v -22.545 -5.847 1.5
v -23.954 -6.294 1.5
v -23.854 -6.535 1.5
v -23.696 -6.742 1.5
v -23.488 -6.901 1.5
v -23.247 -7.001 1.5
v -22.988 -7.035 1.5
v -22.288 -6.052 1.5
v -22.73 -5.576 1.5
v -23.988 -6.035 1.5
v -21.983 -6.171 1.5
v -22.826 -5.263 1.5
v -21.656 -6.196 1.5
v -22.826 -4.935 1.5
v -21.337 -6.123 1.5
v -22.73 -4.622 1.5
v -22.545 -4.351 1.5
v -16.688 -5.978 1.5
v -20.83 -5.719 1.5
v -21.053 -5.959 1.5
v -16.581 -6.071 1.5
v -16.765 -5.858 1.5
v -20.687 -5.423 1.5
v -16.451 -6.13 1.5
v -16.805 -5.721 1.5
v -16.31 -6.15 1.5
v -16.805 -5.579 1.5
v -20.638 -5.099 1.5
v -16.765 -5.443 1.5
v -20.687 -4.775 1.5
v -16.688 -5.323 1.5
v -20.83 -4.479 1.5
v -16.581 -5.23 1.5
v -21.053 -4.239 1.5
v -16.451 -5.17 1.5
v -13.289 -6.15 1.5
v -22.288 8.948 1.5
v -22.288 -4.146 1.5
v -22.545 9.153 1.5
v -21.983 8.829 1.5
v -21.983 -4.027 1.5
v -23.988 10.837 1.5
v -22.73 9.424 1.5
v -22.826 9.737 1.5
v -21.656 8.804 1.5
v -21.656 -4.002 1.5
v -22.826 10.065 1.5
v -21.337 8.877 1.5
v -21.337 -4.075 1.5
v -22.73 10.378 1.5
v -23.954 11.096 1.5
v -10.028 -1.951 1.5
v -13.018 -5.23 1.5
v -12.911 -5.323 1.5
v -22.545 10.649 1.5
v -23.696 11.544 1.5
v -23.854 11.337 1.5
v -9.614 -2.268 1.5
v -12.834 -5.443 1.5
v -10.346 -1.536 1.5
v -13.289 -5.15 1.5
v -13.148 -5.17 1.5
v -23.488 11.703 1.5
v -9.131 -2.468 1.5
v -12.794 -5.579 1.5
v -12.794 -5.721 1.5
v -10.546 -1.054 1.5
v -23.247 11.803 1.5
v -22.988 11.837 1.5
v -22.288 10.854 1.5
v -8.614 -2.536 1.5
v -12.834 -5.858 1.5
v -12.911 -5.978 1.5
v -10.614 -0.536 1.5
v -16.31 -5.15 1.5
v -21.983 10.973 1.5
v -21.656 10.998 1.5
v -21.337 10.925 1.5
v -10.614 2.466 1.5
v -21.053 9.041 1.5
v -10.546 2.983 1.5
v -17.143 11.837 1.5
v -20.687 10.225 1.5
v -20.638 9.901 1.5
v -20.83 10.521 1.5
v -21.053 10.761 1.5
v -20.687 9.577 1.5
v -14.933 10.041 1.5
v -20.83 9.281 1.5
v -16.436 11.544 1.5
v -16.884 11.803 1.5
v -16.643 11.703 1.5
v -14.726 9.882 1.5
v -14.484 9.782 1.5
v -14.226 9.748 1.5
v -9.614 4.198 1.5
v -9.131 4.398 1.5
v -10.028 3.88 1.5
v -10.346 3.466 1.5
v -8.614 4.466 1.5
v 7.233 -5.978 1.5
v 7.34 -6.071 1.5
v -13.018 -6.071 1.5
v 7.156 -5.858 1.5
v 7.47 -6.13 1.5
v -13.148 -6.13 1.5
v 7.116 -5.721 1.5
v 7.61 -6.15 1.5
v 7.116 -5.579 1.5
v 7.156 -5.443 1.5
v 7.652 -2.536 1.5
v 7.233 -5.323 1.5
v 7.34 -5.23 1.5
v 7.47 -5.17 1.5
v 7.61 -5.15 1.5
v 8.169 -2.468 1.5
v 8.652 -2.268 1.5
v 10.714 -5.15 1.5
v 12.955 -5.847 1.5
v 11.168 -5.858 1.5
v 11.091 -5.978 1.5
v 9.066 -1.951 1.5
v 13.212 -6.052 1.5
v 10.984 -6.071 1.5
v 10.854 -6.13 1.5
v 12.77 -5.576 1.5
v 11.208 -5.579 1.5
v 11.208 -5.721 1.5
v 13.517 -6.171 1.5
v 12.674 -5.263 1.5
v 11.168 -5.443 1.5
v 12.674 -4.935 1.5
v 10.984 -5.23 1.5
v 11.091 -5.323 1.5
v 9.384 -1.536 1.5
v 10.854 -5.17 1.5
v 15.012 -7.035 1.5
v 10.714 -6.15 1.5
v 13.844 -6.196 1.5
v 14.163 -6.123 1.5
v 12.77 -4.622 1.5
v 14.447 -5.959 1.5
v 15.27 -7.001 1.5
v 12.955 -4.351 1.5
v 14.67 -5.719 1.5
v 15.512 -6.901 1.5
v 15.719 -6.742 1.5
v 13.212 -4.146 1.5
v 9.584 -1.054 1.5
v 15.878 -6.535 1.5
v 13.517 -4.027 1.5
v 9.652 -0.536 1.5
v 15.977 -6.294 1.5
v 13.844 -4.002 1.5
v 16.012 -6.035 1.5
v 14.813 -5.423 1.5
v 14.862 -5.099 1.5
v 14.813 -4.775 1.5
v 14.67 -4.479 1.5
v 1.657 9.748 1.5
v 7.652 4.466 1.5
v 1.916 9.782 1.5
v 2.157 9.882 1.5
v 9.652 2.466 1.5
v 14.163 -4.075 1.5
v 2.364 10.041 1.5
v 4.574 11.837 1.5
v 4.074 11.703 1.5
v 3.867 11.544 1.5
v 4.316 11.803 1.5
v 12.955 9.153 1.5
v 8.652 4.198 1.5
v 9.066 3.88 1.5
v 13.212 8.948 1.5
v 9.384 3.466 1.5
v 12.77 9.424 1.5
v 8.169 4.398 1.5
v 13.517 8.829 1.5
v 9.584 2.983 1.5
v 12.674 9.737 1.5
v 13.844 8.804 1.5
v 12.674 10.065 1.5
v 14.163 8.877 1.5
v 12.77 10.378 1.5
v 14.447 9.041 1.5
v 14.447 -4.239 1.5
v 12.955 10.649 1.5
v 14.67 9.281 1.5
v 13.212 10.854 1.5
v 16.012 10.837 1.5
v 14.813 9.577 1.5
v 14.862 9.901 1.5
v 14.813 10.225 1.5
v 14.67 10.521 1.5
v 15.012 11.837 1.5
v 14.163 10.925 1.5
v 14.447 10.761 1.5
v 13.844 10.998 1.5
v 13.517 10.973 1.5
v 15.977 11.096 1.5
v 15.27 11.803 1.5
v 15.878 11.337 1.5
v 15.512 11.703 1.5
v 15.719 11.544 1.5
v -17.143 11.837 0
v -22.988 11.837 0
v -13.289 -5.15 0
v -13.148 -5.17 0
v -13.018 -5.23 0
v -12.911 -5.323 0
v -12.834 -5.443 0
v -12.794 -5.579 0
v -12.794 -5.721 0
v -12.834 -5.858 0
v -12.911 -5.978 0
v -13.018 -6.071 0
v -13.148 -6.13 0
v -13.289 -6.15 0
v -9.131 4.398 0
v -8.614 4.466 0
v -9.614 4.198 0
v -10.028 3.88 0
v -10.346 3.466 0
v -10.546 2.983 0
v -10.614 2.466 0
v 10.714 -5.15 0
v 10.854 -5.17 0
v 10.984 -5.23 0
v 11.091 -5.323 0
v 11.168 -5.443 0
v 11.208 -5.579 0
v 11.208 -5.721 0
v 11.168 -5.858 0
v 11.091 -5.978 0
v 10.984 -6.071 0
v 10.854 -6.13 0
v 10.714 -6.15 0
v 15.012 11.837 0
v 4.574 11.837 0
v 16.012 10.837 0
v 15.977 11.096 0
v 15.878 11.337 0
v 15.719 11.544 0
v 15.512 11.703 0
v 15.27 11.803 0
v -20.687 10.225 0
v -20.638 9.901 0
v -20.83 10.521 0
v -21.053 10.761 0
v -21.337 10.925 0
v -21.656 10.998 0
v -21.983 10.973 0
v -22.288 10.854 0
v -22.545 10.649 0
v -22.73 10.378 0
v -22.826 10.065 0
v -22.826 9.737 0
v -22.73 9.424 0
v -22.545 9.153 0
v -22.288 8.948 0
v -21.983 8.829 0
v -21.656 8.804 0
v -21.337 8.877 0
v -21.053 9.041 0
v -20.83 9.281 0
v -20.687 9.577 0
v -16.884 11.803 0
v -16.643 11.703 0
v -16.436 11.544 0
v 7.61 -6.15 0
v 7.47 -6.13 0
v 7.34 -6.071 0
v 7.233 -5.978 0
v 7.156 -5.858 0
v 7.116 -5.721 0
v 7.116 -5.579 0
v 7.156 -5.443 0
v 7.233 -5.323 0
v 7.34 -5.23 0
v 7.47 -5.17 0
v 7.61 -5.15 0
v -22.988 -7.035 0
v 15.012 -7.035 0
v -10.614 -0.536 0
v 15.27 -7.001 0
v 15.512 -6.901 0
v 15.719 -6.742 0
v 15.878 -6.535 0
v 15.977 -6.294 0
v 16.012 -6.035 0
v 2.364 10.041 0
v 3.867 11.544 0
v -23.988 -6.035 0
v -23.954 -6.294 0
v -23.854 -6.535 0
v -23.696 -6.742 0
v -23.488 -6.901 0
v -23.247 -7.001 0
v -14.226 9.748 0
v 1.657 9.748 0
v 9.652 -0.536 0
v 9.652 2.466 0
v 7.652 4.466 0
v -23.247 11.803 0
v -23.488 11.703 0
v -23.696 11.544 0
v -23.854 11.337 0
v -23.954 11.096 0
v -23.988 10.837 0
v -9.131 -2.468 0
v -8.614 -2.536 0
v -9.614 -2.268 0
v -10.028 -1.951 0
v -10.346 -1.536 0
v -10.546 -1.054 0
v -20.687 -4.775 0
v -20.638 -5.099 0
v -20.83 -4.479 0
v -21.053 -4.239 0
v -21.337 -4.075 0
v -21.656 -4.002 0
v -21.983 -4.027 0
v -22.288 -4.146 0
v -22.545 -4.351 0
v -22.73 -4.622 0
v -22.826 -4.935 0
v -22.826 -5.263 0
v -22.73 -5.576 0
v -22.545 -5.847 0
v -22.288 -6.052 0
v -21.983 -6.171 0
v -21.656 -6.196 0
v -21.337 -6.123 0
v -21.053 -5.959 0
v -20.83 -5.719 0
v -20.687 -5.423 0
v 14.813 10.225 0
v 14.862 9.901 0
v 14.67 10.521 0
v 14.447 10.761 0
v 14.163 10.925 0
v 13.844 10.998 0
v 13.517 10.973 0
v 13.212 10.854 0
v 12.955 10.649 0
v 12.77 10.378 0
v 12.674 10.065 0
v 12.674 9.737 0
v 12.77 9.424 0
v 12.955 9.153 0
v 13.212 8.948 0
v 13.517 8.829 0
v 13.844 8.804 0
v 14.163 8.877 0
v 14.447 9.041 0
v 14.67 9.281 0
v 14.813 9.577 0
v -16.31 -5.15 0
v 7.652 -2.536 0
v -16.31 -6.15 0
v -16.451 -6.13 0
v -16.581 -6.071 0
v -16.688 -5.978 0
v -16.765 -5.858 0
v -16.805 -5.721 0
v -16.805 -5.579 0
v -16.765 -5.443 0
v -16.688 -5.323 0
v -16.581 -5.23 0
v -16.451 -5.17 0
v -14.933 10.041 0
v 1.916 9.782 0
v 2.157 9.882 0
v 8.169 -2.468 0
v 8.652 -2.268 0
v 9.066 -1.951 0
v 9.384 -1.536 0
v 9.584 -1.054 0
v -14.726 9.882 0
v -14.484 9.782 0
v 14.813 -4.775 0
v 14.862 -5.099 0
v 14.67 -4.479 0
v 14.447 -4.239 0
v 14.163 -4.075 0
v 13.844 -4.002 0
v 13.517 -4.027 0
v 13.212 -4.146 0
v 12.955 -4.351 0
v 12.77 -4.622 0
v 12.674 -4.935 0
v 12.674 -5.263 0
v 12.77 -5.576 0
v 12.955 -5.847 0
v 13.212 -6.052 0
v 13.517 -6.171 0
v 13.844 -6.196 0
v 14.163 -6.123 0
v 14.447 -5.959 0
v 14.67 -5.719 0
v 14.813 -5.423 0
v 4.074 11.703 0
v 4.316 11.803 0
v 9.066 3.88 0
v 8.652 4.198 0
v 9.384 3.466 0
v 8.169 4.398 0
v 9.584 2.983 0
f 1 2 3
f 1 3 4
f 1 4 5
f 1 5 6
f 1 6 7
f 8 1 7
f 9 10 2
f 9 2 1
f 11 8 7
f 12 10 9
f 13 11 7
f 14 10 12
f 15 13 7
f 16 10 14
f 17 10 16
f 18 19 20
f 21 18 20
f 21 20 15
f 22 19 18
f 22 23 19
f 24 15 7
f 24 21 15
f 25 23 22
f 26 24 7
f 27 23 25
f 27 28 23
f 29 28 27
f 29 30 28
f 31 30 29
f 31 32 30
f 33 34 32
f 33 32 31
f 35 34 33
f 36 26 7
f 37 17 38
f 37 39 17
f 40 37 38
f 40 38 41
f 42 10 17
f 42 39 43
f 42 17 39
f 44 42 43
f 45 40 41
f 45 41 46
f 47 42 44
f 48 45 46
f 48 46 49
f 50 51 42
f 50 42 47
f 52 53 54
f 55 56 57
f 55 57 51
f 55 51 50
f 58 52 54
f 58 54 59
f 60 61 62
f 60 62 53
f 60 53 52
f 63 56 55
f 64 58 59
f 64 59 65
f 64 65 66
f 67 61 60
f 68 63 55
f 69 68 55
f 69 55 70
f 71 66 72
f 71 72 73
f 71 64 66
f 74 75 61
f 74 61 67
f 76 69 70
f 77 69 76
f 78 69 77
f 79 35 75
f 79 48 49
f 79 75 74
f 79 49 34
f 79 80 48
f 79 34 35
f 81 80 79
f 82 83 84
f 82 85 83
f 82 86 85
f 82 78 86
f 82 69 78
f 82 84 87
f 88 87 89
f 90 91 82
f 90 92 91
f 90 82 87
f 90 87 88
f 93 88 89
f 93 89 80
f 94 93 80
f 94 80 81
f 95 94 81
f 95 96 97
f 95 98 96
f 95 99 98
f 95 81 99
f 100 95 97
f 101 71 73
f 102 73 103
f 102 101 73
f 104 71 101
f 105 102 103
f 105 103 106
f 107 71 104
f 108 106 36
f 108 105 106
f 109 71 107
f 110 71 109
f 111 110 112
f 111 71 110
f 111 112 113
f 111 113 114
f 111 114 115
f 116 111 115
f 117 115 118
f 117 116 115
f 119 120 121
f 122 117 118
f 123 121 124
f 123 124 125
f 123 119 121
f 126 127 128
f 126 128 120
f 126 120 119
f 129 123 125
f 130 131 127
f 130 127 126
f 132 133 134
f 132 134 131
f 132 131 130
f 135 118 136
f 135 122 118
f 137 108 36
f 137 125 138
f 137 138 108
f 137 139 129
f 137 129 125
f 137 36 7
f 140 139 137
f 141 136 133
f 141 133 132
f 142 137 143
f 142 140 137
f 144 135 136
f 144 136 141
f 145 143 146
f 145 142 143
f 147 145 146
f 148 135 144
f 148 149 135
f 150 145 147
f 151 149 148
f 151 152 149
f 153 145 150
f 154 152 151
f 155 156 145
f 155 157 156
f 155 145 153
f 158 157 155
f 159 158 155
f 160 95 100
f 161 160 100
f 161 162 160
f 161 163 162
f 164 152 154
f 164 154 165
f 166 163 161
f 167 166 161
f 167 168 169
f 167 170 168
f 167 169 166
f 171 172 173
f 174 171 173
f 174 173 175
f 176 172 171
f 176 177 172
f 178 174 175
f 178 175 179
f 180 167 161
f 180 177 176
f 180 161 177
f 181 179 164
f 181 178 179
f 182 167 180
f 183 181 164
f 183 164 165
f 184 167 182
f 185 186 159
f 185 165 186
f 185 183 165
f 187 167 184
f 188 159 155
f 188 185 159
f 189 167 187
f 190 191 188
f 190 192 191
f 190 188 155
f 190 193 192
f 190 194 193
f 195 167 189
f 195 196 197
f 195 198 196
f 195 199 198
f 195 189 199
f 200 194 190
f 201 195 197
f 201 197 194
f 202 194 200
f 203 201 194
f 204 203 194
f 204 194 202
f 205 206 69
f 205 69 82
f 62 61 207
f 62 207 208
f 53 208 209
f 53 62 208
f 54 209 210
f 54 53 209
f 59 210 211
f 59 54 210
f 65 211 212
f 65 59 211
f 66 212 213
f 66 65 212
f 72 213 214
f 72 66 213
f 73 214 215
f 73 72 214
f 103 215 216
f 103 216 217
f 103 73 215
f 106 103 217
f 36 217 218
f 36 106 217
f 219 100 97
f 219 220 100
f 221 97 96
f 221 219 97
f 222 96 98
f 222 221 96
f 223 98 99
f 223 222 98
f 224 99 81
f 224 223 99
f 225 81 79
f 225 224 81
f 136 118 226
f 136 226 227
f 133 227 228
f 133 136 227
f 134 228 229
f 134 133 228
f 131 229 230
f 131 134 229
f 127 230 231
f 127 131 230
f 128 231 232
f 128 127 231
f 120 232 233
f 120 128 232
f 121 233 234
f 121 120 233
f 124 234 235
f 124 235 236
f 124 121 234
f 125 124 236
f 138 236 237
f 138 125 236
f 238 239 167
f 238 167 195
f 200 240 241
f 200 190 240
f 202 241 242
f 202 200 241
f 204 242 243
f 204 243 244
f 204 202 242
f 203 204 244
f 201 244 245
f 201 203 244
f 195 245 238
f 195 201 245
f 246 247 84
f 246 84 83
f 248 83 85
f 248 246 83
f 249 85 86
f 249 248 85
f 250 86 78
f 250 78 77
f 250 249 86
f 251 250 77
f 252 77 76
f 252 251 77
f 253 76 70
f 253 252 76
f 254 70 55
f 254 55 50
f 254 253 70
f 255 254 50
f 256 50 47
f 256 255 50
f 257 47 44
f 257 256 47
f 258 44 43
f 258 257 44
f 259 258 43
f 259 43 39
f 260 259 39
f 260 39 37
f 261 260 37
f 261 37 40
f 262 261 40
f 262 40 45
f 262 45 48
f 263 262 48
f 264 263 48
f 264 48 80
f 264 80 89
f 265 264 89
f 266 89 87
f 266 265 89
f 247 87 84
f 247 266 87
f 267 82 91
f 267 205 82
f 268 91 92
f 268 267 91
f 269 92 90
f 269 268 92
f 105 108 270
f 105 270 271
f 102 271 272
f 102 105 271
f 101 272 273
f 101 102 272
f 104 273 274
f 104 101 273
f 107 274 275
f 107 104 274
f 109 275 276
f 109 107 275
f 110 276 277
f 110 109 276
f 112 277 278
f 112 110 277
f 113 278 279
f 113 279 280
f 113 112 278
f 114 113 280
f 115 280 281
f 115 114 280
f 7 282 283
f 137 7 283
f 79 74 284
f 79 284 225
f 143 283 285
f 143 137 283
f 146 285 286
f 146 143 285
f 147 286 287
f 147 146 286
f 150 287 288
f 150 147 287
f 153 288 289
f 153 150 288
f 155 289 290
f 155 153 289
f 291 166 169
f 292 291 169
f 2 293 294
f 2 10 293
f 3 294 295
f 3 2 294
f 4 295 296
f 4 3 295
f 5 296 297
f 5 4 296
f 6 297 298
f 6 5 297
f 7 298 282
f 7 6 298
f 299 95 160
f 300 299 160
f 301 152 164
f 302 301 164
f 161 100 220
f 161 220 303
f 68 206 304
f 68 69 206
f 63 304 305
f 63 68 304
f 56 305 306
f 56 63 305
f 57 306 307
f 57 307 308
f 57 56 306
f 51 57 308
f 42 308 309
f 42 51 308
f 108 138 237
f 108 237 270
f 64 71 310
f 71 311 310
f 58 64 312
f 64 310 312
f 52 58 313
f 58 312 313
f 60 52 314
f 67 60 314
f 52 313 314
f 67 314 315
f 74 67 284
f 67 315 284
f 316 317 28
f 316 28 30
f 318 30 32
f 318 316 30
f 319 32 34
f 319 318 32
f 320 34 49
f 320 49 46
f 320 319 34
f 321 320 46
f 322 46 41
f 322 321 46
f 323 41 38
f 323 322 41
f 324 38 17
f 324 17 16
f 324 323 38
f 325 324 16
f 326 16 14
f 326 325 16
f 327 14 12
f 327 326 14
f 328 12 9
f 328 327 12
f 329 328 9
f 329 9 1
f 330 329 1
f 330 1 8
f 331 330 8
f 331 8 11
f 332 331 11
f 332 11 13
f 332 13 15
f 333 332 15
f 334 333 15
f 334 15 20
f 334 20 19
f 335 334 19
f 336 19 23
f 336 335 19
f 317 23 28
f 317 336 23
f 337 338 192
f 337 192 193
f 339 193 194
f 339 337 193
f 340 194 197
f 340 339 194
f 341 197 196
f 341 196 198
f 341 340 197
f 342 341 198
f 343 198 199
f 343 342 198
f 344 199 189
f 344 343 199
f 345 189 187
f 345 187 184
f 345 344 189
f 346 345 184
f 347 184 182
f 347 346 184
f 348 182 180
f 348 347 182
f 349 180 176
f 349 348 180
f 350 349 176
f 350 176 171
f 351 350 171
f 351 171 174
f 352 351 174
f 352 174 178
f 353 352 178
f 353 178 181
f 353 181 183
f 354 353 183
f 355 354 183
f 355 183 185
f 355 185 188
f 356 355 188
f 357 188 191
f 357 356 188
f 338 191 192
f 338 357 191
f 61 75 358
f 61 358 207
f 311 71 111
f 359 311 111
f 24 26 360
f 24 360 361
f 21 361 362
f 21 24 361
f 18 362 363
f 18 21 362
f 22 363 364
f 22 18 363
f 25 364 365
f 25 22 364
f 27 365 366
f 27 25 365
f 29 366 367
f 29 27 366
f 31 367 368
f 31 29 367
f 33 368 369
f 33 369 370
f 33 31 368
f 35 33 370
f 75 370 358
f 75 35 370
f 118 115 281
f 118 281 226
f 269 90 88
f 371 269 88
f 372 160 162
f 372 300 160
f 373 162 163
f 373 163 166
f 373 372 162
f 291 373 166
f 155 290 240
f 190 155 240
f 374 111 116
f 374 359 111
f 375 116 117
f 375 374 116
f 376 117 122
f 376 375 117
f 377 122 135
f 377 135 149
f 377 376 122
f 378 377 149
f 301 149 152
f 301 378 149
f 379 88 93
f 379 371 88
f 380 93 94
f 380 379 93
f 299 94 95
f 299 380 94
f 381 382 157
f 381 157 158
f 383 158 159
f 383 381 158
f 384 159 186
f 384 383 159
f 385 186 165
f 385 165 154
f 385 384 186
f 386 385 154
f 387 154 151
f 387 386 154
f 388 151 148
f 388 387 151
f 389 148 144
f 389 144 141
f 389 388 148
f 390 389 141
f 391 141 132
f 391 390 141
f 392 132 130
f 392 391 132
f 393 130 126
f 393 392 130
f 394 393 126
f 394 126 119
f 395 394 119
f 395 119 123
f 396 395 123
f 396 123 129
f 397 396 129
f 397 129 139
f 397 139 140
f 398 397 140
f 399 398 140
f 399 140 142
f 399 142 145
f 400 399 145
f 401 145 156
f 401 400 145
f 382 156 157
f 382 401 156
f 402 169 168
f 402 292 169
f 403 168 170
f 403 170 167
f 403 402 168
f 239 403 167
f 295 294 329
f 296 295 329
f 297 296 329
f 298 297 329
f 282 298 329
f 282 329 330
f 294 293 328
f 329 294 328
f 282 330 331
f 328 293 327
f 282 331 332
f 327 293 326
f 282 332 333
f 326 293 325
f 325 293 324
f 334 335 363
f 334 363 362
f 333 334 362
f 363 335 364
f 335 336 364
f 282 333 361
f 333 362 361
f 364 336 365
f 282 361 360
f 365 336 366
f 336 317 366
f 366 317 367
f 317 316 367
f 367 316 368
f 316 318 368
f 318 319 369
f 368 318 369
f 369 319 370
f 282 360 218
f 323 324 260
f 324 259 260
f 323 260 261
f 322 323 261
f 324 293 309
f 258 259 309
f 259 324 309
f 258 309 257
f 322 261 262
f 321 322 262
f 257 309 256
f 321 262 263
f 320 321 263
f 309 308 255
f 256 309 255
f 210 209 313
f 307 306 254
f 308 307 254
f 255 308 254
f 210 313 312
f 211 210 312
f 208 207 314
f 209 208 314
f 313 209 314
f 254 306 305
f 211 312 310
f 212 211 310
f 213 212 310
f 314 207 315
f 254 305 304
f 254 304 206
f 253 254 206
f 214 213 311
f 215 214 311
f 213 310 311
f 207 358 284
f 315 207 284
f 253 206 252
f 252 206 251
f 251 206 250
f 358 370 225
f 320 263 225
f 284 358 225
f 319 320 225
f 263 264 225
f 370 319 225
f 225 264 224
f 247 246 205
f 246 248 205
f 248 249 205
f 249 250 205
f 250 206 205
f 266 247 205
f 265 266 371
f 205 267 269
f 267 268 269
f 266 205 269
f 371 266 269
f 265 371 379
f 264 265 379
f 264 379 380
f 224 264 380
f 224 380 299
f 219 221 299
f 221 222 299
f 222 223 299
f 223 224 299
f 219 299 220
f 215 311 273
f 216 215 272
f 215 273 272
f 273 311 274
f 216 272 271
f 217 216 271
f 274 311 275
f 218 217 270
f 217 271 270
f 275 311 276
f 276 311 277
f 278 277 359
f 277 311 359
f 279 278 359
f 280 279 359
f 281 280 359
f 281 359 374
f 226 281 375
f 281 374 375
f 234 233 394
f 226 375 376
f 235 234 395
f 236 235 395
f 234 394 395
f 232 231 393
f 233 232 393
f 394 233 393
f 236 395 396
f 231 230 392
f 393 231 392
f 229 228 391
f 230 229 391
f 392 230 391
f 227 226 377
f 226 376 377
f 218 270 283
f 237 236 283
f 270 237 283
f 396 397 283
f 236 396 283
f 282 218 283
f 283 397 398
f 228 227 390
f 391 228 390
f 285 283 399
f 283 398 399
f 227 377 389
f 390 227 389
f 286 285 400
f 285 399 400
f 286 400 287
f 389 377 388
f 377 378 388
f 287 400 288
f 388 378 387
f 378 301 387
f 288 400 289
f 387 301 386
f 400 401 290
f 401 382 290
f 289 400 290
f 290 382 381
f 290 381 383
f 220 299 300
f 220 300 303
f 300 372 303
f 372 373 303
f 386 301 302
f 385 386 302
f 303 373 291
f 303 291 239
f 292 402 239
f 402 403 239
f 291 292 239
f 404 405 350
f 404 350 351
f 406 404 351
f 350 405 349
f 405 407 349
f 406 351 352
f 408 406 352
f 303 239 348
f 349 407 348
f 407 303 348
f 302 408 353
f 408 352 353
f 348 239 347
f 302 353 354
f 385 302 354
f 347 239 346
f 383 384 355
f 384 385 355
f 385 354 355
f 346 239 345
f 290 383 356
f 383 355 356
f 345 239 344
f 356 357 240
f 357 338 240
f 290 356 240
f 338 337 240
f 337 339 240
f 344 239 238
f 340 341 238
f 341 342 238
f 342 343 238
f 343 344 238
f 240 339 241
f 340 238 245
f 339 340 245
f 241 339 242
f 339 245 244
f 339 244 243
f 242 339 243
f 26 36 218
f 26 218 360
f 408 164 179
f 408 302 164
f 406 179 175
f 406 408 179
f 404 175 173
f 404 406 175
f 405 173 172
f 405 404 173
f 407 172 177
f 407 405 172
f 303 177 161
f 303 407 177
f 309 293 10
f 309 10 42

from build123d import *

# Parameters (mm, degrees)
SKETCH_1_W          = 40
SKETCH_1_H          = 18.871619184
SKETCH_1_R          = 1.1
EXTRUDE_1_DEPTH     = 1.5
SKETCH_2_W          = 20.265588098
SKETCH_2_H          = 7.002088202
CUT_EXTRUDE_1_DEPTH = 1.5
FILLET_1_R          = 1
FILLET_2_R          = 1
FILLET_3_R          = 2


with BuildPart() as part:
    # 草图1 → 凸台-拉伸1 (new body)
    with BuildSketch(Plane.XY):
        with Locations((-3.988440653, 2.400990099)):
            Rectangle(SKETCH_1_W, SKETCH_1_H)
        with Locations((-21.738440653, 9.900990099)):
            Circle(SKETCH_1_R, mode=Mode.SUBTRACT)
        with Locations((-21.738440653, -5.099009901)):
            Circle(SKETCH_1_R, mode=Mode.SUBTRACT)
        with Locations((13.761559347, -5.099009901)):
            Circle(SKETCH_1_R, mode=Mode.SUBTRACT)
        with Locations((13.761559347, 9.900990099)):
            Circle(SKETCH_1_R, mode=Mode.SUBTRACT)
    extrude(amount=EXTRUDE_1_DEPTH)

    # 草图2 → 切除-拉伸1 (cut)
    with BuildSketch(Plane.XY.offset(1.5)):
        Polygon((-16.728608447, 11.836799691), (-14.639805099, 9.747996342), (2.071462084, 9.747996342), (5.519738876, 13.196273134), (-14.871851344, 13.196273134), align=None)
        with Locations((-0.480960338, 0.9646533)):
            Rectangle(SKETCH_2_W, SKETCH_2_H)
        with BuildLine():
            Line((-16.310435566, -5.15021554), (-13.288801442, -5.15021554))
            ThreePointArc((-13.288801442, -5.15021554), (-12.788801442, -5.65021554), (-13.288801442, -6.15021554))
            Line((-13.288801442, -6.15021554), (-16.310435566, -6.15021554))
            ThreePointArc((-16.310435566, -6.15021554), (-16.810435566, -5.65021554), (-16.310435566, -5.15021554))
        make_face()
        with BuildLine():
            Line((7.610434302, -5.15021554), (10.713575026, -5.15021554))
            ThreePointArc((10.713575026, -5.15021554), (11.213575026, -5.65021554), (10.713575026, -6.15021554))
            Line((10.713575026, -6.15021554), (7.610434302, -6.15021554))
            ThreePointArc((7.610434302, -6.15021554), (7.110434302, -5.65021554), (7.610434302, -5.15021554))
        make_face()
    extrude(amount=-CUT_EXTRUDE_1_DEPTH, mode=Mode.SUBTRACT)

    # 圆角1
    fillet_1_edges = [part.edges().sort_by_distance(p)[0] for p in [
        (4.160265432, 11.836799691, 0.75),
        (-16.728608447, 11.836799691, 0.75),
        (2.071462084, 9.747996342, 0.75),
        (-14.639805099, 9.747996342, 0.75),
    ]]
    fillet(fillet_1_edges, radius=FILLET_1_R)

    # 圆角2
    fillet_2_edges = [part.edges().sort_by_distance(p)[0] for p in [
        (16.011559347, -7.034819493, 0.75),
        (-23.988440653, -7.034819493, 0.75),
        (-23.988440653, 11.836799691, 0.75),
        (16.011559347, 11.836799691, 0.75),
    ]]
    fillet(fillet_2_edges, radius=FILLET_2_R)

    # 圆角3
    fillet_3_edges = [part.edges().sort_by_distance(p)[0] for p in [
        (9.651833711, 4.465697401, 0.75),
        (9.651833711, -2.536390801, 0.75),
        (-10.613754387, -2.536390801, 0.75),
        (-10.613754387, 4.465697401, 0.75),
    ]]
    fillet(fillet_3_edges, radius=FILLET_3_R)


solid = part.part
